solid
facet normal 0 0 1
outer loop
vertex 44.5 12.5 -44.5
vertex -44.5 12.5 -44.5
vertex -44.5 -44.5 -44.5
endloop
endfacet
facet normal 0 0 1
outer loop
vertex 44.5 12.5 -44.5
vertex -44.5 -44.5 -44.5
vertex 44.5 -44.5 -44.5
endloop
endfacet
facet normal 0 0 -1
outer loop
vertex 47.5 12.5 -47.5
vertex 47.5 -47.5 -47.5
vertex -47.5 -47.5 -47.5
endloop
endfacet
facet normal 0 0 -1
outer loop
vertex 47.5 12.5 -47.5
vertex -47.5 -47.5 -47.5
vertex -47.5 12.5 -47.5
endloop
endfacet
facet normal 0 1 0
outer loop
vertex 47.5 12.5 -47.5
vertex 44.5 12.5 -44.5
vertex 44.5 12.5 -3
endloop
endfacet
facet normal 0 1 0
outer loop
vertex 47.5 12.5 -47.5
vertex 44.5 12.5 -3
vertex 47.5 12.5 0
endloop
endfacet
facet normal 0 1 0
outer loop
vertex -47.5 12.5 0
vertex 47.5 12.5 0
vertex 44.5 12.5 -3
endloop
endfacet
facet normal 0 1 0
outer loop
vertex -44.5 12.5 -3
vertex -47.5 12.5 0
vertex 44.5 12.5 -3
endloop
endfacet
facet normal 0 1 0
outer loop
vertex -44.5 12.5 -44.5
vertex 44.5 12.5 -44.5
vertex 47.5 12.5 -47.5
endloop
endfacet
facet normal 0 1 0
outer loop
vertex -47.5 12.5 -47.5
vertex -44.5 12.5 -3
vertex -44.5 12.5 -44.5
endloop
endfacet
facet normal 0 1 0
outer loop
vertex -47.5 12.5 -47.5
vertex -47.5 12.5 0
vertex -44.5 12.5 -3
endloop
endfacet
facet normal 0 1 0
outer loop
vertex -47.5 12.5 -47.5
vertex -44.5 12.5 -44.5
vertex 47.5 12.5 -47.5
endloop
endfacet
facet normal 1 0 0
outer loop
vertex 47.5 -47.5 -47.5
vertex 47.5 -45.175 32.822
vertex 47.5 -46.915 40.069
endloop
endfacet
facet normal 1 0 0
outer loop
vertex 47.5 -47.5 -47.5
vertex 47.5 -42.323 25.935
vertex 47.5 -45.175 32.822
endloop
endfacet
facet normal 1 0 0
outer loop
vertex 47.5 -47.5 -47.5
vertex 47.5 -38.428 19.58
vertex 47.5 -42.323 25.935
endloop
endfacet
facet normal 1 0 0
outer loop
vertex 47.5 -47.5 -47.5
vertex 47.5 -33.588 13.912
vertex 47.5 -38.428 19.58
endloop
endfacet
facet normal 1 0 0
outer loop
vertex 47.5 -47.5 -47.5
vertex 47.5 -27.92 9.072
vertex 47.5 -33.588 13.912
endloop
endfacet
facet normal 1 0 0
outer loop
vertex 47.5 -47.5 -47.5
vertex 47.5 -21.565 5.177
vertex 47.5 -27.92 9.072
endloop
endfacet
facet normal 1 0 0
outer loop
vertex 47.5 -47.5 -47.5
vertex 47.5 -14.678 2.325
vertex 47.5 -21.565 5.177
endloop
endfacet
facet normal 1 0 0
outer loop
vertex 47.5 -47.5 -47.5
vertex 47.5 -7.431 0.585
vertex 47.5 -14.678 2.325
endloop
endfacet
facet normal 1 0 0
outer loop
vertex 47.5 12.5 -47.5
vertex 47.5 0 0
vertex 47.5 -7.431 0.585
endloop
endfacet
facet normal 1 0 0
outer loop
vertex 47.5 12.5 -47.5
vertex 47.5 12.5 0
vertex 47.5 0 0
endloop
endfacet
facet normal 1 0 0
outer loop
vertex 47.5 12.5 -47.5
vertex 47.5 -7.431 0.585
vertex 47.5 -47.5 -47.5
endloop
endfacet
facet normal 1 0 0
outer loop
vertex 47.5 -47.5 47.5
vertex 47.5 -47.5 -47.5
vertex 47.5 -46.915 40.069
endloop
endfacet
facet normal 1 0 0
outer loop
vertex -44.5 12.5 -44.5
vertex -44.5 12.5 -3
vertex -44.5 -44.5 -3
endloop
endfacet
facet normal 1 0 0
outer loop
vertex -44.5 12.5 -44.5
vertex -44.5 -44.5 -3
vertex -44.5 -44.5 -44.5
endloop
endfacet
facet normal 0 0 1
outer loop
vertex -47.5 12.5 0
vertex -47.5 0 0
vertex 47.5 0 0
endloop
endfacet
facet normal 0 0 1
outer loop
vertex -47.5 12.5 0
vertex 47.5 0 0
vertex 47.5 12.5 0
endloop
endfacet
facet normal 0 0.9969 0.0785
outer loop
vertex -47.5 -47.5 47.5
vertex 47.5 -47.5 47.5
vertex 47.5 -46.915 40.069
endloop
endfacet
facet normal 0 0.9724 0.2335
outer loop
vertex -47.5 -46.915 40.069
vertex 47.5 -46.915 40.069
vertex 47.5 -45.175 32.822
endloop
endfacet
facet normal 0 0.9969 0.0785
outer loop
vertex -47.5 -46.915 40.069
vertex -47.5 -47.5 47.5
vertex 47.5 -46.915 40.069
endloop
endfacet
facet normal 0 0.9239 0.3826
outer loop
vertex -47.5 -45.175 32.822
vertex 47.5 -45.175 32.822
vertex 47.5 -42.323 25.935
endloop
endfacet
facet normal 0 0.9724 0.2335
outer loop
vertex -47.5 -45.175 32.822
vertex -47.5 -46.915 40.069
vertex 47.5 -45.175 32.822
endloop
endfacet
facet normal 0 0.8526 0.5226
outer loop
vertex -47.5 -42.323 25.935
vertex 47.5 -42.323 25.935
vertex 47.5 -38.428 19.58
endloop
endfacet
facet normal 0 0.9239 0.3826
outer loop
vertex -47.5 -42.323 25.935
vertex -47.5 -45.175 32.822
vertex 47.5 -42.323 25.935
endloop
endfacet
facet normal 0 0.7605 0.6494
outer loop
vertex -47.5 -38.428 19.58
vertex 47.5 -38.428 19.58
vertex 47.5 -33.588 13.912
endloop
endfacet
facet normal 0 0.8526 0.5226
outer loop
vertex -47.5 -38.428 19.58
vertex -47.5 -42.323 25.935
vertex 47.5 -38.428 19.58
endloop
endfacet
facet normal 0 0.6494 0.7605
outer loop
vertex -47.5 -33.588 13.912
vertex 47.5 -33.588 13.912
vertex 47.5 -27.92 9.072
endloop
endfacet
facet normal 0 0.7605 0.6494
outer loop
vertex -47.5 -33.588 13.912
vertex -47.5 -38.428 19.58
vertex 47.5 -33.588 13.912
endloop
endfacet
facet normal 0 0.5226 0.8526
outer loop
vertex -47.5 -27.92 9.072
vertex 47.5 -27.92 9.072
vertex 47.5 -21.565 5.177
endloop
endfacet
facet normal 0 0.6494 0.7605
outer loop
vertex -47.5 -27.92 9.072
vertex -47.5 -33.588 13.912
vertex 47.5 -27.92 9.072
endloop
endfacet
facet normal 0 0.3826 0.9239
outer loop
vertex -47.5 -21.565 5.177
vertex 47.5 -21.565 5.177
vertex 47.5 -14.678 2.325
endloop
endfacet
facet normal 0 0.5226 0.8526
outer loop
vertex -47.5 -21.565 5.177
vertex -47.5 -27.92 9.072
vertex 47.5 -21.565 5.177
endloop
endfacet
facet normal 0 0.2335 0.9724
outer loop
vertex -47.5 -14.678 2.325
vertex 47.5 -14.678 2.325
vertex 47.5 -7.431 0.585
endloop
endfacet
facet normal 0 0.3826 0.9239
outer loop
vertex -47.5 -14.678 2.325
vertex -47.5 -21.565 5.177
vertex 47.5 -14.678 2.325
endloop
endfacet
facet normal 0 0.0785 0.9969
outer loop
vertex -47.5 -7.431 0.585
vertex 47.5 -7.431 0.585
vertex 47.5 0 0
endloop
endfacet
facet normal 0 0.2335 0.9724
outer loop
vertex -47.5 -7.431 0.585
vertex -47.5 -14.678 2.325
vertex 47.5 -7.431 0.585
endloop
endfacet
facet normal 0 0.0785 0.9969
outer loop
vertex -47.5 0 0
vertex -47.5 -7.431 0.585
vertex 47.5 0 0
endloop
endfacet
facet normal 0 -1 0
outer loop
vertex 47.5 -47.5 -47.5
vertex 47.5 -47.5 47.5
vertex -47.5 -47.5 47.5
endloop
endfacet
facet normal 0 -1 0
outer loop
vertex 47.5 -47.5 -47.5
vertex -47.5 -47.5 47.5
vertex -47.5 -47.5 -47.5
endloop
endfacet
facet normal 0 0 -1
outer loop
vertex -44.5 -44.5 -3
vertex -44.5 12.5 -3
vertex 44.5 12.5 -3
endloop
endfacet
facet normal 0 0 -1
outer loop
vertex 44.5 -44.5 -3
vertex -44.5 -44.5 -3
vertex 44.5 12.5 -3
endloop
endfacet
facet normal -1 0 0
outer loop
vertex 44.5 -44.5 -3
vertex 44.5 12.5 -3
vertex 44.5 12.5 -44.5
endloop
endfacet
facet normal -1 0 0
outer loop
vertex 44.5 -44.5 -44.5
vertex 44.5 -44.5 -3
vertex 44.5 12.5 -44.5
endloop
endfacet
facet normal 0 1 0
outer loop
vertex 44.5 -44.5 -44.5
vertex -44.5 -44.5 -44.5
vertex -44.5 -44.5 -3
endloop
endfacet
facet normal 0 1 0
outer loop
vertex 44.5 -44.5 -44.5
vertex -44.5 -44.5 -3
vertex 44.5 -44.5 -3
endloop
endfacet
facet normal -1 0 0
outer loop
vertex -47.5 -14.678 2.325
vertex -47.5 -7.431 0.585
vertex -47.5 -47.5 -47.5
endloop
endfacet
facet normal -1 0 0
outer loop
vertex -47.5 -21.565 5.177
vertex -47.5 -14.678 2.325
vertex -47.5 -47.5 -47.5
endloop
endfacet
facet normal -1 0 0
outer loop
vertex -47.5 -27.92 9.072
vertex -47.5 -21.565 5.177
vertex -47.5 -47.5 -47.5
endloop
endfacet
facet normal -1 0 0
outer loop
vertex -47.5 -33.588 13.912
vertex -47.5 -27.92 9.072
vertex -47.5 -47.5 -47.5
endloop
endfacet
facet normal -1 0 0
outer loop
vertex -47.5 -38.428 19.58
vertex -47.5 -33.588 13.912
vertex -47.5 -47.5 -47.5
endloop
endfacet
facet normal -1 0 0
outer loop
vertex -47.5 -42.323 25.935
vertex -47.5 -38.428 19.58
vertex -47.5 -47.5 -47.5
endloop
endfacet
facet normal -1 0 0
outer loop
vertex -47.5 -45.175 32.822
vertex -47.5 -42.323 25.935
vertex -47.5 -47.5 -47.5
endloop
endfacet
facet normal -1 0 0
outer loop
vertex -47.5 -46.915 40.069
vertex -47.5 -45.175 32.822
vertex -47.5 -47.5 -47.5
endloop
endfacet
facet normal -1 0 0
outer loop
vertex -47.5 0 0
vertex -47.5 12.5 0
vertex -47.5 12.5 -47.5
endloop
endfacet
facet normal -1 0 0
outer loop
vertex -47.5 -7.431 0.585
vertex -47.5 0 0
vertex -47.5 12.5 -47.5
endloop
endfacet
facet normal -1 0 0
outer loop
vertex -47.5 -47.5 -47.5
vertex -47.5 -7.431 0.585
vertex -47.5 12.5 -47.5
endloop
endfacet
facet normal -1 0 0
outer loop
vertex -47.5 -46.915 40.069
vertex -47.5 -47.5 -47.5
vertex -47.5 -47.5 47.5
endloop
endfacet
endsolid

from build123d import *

# Parameters (mm, degrees)
ESBO_O3_W                  = 95
ESBO_O3_H                  = 95
RESSALTO_EXTRUS_O2_DEPTH   = 47.5
CORTE_EXTRUS_O1_DEPTH      = 117.350762782
CORTE_EXTRUS_O1_DEPTH_BACK = 117.350762782
ESBO_O4_R                  = 47.5
CORTE_EXTRUS_O2_DEPTH      = 83.27241336
CORTE_EXTRUS_O2_DEPTH_BACK = 83.27241336
CORTE_EXTRUS_O3_DEPTH      = 83.27241336
CORTE_EXTRUS_O3_DEPTH_BACK = 83.27241336
ESBO_O6_W                  = 47.5
ESBO_O6_H                  = 35
ESBO_O7_W                  = 89
ESBO_O7_H                  = 41.5
CORTE_EXTRUS_O4_DEPTH      = 57


with BuildPart() as part:
    # Esboço3 → Ressalto-extrusão2 (new, symmetric)
    with BuildSketch(Plane(origin=(0, 0, 0), x_dir=(0, 0, -1), z_dir=(1, 0, 0))):
        Rectangle(ESBO_O3_W, ESBO_O3_H)
    extrude(amount=RESSALTO_EXTRUS_O2_DEPTH, both=True)

    # Esboço4 → Corte-extrusão1 (cut, two sides: drawn at the far end of the back side and taken through both)
    with BuildSketch(Plane(origin=(47.5, 0, 0), x_dir=(0, 0, -1), z_dir=(1, 0, 0)).offset(-CORTE_EXTRUS_O1_DEPTH_BACK)):
        with Locations((-47.5, 0)):
            Circle(ESBO_O4_R)
    extrude(amount=CORTE_EXTRUS_O1_DEPTH + CORTE_EXTRUS_O1_DEPTH_BACK, mode=Mode.SUBTRACT)

    # Esboço5 → Corte-extrusão2 (cut, two sides: drawn at the far end of the back side and taken through both)
    with BuildSketch(Plane(origin=(0, 0, 0), x_dir=(0, 0, -1), z_dir=(1, 0, 0)).offset(-CORTE_EXTRUS_O2_DEPTH_BACK)):
        Polygon((0, 0), (0, 47.5), (-47.5, 47.5), align=None)
    extrude(amount=CORTE_EXTRUS_O2_DEPTH + CORTE_EXTRUS_O2_DEPTH_BACK, mode=Mode.SUBTRACT)

    # Esboço6 → Corte-extrusão3 (cut, two sides: drawn at the far end of the back side and taken through both)
    with BuildSketch(Plane(origin=(0, 0, 0), x_dir=(0, 0, -1), z_dir=(1, 0, 0)).offset(-CORTE_EXTRUS_O3_DEPTH_BACK)):
        with Locations((23.75, 30)):
            Rectangle(ESBO_O6_W, ESBO_O6_H)
    extrude(amount=CORTE_EXTRUS_O3_DEPTH + CORTE_EXTRUS_O3_DEPTH_BACK, mode=Mode.SUBTRACT)

    # Esboço7 → Corte-extrusão4 (cut)
    with BuildSketch(Plane(origin=(0, 12.5, 0), x_dir=(1, 0, 0), z_dir=(0, 1, 0))):
        with Locations((0, 23.75)):
            Rectangle(ESBO_O7_W, ESBO_O7_H)
    extrude(amount=-CORTE_EXTRUS_O4_DEPTH, mode=Mode.SUBTRACT)


solid = part.part
